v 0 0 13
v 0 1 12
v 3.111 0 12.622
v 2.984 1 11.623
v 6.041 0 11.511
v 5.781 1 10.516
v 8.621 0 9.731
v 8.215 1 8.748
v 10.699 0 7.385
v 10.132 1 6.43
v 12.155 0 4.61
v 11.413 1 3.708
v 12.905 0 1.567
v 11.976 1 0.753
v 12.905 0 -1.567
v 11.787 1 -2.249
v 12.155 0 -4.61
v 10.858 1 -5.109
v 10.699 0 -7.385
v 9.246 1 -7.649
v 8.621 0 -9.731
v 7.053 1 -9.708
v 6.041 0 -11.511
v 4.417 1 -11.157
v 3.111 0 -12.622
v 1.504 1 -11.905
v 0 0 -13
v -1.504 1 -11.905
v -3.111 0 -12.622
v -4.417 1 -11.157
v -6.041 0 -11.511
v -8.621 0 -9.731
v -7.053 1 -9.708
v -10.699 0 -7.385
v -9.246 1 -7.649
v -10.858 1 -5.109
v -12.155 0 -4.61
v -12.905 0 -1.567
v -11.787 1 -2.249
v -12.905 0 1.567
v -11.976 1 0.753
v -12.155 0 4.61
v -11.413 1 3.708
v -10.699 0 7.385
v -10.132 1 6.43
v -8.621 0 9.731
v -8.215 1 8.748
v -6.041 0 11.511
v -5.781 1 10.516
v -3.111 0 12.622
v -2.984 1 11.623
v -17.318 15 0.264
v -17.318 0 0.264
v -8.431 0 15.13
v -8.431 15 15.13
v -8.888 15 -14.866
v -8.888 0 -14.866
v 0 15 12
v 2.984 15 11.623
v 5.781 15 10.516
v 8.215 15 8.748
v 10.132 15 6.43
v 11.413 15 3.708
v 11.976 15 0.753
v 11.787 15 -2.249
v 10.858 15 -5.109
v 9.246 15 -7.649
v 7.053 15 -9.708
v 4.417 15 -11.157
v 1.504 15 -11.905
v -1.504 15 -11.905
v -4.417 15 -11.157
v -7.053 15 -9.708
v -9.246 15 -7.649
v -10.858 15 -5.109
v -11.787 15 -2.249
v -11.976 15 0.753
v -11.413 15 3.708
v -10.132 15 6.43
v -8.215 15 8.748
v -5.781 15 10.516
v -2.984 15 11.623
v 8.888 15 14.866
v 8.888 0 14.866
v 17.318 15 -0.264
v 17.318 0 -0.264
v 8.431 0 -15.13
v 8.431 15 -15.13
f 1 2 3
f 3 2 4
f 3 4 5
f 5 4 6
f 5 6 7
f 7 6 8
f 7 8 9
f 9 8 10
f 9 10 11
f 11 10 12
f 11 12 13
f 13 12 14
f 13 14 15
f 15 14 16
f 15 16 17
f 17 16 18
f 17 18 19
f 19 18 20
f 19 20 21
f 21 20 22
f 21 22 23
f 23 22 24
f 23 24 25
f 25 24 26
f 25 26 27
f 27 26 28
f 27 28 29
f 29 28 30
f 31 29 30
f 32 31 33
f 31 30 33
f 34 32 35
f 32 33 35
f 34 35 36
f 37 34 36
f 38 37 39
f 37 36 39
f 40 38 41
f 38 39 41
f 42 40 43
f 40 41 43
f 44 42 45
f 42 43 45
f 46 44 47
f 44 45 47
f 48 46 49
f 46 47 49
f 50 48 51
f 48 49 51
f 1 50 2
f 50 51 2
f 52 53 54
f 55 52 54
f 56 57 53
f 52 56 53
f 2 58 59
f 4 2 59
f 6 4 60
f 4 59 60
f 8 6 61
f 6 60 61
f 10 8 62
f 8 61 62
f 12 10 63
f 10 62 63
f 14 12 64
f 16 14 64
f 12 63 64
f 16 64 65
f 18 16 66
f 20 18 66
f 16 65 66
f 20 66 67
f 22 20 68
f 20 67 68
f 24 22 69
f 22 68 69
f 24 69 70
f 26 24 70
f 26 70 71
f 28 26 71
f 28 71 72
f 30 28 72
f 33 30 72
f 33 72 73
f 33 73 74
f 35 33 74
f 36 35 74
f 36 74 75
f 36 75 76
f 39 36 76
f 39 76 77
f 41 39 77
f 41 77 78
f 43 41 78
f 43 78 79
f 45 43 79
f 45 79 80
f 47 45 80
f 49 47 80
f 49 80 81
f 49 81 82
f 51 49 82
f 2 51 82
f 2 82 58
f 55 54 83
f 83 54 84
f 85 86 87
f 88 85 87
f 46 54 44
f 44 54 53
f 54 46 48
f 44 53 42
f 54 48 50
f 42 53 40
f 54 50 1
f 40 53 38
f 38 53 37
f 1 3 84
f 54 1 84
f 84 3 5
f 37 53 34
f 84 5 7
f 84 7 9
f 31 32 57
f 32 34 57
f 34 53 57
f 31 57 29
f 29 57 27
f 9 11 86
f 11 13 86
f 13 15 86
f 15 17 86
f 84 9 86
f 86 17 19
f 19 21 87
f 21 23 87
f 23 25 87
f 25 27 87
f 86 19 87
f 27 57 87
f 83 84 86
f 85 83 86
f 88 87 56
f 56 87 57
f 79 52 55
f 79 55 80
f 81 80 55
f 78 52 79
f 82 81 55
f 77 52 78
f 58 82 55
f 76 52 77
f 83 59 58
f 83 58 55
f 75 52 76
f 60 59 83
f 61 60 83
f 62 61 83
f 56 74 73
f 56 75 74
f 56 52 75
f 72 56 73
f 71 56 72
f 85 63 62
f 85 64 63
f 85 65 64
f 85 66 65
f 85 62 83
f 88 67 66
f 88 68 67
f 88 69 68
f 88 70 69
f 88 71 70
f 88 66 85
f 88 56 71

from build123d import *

# Parameters (mm, degrees)
BOSS_EXTRUDE1_DEPTH = 15
SKETCH2_R           = 12
CUT_EXTRUDE1_DEPTH  = 28.45639893
CHAMFER1_SIZE       = 1


with BuildPart() as part:
    # Sketch1 → Boss-Extrude1 (new body)
    with BuildSketch(Plane(origin=(0, 0, 0), x_dir=(1, 0, 0), z_dir=(0, 1, 0))):
        Polygon((8.887808978, -14.866299189), (17.318497247, 0.263918764), (8.430688269, 15.130217953), (-8.887808978, 14.866299189), (-17.318497247, -0.263918764), (-8.430688269, -15.130217953), align=None)
    extrude(amount=BOSS_EXTRUDE1_DEPTH)

    # Sketch2 → Cut-Extrude1 (cut, through all)
    with BuildSketch(Plane(origin=(0, 15, 0), x_dir=(1, 0, 0), z_dir=(0, 1, 0))):
        with Locations(Location((0, 0, 0), (0, 0, 270))):
            Circle(SKETCH2_R)
    extrude(amount=-CUT_EXTRUDE1_DEPTH, mode=Mode.SUBTRACT)

    # Chamfer1
    chamfer1_edges = [part.edges().sort_by_distance(p)[0] for p in [
        (0, 0, -12),
    ]]
    chamfer(chamfer1_edges, length=CHAMFER1_SIZE)


solid = part.part
